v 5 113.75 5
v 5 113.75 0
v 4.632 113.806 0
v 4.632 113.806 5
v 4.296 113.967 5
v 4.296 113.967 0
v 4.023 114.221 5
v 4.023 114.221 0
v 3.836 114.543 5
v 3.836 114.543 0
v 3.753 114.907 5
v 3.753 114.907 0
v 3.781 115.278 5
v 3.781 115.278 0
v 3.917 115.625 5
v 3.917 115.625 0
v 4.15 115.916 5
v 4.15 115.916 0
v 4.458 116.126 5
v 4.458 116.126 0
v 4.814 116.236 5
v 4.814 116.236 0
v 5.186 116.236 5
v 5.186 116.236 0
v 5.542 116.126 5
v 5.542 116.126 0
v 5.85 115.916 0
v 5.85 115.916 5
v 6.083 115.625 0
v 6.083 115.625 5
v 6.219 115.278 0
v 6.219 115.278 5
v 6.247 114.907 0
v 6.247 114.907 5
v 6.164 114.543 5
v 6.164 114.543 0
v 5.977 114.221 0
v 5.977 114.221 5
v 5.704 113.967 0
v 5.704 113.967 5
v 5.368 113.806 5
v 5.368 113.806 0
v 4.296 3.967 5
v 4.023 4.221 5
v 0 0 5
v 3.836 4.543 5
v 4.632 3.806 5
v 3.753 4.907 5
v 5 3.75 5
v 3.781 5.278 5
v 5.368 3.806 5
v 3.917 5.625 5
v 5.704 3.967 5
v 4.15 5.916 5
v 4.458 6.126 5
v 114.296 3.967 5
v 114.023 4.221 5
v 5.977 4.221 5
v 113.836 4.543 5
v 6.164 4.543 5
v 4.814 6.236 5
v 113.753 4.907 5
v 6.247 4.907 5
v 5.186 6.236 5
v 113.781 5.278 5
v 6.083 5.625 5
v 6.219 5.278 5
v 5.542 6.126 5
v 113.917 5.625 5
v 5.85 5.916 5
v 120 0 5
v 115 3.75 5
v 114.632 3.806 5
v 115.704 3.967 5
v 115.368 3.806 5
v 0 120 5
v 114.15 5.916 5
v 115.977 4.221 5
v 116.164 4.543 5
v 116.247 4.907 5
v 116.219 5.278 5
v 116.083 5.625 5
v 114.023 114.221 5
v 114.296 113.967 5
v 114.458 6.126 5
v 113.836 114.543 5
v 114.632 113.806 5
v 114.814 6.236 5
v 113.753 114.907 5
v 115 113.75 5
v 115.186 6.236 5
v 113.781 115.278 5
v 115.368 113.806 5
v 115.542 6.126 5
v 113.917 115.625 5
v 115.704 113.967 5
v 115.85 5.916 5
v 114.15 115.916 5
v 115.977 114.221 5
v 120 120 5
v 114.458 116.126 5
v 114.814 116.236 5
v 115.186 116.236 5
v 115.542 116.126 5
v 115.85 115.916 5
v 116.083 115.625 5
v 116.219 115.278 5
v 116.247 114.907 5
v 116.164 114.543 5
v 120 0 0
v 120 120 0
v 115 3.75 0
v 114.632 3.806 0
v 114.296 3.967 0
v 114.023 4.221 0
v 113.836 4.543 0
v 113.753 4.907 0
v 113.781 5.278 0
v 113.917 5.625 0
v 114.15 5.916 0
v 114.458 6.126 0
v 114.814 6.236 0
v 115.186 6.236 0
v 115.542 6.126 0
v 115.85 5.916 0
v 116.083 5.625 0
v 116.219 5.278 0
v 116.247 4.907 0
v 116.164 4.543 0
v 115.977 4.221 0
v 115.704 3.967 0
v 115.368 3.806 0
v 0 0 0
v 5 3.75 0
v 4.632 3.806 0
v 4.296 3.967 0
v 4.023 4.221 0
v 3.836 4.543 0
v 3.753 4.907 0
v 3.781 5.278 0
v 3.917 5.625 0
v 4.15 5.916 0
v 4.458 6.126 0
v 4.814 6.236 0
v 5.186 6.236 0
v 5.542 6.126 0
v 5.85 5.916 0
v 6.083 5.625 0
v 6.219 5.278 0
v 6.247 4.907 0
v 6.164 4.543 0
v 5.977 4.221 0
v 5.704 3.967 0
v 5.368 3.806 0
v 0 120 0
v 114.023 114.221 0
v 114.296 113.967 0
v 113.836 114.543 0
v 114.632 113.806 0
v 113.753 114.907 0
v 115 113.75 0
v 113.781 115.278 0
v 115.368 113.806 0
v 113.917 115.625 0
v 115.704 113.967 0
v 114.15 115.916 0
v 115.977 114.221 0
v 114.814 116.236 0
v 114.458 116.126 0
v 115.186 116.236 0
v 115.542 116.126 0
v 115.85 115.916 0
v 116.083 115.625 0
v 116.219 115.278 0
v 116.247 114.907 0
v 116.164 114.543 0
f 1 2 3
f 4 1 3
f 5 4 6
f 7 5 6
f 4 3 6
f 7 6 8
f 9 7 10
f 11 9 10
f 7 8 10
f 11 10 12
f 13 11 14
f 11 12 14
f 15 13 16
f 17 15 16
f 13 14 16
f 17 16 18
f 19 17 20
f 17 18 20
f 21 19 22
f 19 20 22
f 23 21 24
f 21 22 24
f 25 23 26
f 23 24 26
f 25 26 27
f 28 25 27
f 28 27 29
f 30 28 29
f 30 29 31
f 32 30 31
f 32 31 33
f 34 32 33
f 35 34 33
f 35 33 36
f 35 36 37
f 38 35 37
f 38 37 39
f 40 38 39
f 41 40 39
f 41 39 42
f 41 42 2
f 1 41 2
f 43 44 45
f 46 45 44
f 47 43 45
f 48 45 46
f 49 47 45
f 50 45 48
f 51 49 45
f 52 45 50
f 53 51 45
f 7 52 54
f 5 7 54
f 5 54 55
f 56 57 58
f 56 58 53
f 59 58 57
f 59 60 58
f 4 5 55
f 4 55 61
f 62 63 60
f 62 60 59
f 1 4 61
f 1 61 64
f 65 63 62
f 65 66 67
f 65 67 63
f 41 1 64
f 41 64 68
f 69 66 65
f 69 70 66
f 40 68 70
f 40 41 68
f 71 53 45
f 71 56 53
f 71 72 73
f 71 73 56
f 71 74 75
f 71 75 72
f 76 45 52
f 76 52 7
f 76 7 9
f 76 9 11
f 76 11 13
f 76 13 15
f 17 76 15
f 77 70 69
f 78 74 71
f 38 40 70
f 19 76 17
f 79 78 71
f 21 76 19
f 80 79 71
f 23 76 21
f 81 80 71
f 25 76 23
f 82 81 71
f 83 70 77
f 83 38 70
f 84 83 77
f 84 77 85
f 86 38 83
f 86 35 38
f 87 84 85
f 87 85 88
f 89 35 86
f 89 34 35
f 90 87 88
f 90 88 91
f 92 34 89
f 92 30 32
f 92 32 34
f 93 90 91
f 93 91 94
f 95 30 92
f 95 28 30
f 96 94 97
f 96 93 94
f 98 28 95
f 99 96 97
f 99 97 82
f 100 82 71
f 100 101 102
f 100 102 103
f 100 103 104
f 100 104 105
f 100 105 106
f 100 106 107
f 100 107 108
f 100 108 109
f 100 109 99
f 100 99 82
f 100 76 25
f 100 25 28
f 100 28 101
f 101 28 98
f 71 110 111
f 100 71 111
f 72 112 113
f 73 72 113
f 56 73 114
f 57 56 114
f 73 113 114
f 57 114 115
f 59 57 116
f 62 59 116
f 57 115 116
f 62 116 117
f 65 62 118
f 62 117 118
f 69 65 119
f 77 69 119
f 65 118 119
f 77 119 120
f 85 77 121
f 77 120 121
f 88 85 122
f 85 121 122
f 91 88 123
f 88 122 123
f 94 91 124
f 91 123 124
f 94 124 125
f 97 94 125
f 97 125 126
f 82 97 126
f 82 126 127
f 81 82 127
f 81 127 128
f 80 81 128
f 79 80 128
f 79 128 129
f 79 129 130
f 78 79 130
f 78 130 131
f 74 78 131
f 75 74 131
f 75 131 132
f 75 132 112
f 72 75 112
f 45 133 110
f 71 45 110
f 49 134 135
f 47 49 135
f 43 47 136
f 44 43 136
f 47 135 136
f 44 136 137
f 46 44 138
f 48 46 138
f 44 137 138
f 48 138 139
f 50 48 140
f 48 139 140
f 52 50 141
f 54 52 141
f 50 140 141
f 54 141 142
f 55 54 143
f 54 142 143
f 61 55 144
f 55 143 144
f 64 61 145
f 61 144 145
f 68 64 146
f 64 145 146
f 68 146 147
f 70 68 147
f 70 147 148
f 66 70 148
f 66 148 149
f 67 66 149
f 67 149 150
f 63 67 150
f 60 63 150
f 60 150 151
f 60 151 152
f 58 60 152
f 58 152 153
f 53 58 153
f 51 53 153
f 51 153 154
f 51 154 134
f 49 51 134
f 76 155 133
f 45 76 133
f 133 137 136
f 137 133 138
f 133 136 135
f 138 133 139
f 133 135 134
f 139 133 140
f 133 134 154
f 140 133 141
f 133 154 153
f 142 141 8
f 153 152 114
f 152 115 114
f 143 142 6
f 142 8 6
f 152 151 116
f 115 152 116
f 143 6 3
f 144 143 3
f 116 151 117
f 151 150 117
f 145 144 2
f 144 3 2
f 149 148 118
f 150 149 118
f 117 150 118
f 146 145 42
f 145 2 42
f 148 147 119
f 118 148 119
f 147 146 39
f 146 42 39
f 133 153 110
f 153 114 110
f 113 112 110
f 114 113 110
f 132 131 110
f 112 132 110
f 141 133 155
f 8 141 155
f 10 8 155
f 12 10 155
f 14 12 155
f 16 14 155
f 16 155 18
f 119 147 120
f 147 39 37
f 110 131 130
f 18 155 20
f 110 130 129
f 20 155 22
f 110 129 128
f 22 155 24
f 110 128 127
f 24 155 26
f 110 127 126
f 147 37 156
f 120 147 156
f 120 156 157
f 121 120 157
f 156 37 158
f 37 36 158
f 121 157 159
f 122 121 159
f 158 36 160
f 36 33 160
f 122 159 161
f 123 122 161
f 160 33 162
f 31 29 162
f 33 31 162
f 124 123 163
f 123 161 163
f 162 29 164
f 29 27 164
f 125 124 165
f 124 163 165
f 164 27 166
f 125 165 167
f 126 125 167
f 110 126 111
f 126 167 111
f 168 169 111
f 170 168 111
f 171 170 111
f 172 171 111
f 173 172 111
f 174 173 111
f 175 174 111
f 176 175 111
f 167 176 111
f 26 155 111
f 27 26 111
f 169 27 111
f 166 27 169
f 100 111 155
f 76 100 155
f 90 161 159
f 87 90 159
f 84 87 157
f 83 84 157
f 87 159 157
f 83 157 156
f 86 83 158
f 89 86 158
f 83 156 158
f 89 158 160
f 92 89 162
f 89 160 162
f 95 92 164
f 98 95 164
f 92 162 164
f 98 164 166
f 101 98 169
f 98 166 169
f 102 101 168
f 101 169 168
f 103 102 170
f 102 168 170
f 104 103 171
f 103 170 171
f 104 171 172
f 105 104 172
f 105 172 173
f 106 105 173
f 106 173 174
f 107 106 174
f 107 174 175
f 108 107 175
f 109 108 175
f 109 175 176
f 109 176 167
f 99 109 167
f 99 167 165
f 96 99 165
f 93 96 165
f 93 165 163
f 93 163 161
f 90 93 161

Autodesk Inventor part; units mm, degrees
ref_plane "YZ Plane" through (0, 0, 0) normal (1, 0, 0) x (0, 1, 0)
ref_plane "XZ Plane" through (0, 0, 0) normal (0, 1, 0) x (-1, 0, 0)
ref_plane "XY Plane" through (0, 0, 0) normal (0, 0, 1) x (1, 0, 0)
sketch "Sketch1" plane through (0, 0, 0) normal (0, 0, 1) x (1, 0, 0)
  line L0 (0, 0) -> (120, 0)
  line L1 (120, 0) -> (120, 120)
  line L2 (120, 120) -> (0, 120)
  line L3 (0, 120) -> (0, 0)
  dimension "d0" = 120
  dimension "d1" = 120
  dimension "d2" = 120
extrude "Extrusion1" add sketch "Sketch1" along normal blind 5
sketch "Sketch3" plane through (0, 0, 5) normal (0, 0, 1) x (1, 0, 0)
  line L0 (120, 120) -> (0, 120) projected
  line L1 (0, 120) -> (5, 120)
  line L2 (5, 120) -> (5, 115)
  point P0 (0, 0)
  dimension "d7" = 5
  dimension "d8" = 5
hole "Hole1" at (5, 115, 5) direction (0, 0, -1) diameter 2.5 depth 38.1 tip angle 118
sketch "Sketch4" plane through (0, 0, 5) normal (0, 0, 1) x (1, 0, 0)
  line L0 (0, 120) -> (0, 0) projected
  line L1 (0, 0) -> (5, 0)
  line L2 (0, 0) -> (120, 0) projected
  line L3 (5, 0) -> (0, 0)
  line L4 (0, 0) -> (0, 5)
  line L5 (0, 5) -> (5, 5)
  dimension "d16" = 5
  dimension "d17" = 5
  dimension "d18" = 5
  dimension "d19" = 5
hole "Hole2" at (5, 5, 5) direction (0, 0, -1) diameter 2.5 depth 38.1 tip angle 118
sketch "Sketch8" plane through (0, 0, 5) normal (0, 0, 1) x (1, 0, 0)
  point P0 (0, 0)
sketch "Sketch9" plane through (0, 0, 5) normal (0, 0, 1) x (1, 0, 0)
  line L0 (0, 0) -> (120, 0) projected
  line L1 (120, 0) -> (120, 5)
  line L2 (120, 0) -> (120, 120) projected
  line L3 (120, 5) -> (115, 5)
  dimension "d33" = 5
  dimension "d34" = 5
hole "Hole3" at (115, 5, 5) direction (0, 0, -1) diameter 2.5 depth 38.1 tip angle 118
sketch "Sketch10" plane through (0, 0, 5) normal (0, 0, 1) x (1, 0, 0)
  line L0 (120, 120) -> (0, 120) projected
  line L1 (120, 120) -> (120, 115)
  line L2 (120, 0) -> (120, 120) projected
  line L3 (120, 115) -> (115, 115)
  point P0 (0, 0)
  dimension "d42" = 5
  dimension "d43" = 5
hole "Hole4" at (115, 115, 5) direction (0, 0, -1) diameter 2.5 depth 38.1 tip angle 118
properties part number "3d_enclosure_2_19_top_1"
